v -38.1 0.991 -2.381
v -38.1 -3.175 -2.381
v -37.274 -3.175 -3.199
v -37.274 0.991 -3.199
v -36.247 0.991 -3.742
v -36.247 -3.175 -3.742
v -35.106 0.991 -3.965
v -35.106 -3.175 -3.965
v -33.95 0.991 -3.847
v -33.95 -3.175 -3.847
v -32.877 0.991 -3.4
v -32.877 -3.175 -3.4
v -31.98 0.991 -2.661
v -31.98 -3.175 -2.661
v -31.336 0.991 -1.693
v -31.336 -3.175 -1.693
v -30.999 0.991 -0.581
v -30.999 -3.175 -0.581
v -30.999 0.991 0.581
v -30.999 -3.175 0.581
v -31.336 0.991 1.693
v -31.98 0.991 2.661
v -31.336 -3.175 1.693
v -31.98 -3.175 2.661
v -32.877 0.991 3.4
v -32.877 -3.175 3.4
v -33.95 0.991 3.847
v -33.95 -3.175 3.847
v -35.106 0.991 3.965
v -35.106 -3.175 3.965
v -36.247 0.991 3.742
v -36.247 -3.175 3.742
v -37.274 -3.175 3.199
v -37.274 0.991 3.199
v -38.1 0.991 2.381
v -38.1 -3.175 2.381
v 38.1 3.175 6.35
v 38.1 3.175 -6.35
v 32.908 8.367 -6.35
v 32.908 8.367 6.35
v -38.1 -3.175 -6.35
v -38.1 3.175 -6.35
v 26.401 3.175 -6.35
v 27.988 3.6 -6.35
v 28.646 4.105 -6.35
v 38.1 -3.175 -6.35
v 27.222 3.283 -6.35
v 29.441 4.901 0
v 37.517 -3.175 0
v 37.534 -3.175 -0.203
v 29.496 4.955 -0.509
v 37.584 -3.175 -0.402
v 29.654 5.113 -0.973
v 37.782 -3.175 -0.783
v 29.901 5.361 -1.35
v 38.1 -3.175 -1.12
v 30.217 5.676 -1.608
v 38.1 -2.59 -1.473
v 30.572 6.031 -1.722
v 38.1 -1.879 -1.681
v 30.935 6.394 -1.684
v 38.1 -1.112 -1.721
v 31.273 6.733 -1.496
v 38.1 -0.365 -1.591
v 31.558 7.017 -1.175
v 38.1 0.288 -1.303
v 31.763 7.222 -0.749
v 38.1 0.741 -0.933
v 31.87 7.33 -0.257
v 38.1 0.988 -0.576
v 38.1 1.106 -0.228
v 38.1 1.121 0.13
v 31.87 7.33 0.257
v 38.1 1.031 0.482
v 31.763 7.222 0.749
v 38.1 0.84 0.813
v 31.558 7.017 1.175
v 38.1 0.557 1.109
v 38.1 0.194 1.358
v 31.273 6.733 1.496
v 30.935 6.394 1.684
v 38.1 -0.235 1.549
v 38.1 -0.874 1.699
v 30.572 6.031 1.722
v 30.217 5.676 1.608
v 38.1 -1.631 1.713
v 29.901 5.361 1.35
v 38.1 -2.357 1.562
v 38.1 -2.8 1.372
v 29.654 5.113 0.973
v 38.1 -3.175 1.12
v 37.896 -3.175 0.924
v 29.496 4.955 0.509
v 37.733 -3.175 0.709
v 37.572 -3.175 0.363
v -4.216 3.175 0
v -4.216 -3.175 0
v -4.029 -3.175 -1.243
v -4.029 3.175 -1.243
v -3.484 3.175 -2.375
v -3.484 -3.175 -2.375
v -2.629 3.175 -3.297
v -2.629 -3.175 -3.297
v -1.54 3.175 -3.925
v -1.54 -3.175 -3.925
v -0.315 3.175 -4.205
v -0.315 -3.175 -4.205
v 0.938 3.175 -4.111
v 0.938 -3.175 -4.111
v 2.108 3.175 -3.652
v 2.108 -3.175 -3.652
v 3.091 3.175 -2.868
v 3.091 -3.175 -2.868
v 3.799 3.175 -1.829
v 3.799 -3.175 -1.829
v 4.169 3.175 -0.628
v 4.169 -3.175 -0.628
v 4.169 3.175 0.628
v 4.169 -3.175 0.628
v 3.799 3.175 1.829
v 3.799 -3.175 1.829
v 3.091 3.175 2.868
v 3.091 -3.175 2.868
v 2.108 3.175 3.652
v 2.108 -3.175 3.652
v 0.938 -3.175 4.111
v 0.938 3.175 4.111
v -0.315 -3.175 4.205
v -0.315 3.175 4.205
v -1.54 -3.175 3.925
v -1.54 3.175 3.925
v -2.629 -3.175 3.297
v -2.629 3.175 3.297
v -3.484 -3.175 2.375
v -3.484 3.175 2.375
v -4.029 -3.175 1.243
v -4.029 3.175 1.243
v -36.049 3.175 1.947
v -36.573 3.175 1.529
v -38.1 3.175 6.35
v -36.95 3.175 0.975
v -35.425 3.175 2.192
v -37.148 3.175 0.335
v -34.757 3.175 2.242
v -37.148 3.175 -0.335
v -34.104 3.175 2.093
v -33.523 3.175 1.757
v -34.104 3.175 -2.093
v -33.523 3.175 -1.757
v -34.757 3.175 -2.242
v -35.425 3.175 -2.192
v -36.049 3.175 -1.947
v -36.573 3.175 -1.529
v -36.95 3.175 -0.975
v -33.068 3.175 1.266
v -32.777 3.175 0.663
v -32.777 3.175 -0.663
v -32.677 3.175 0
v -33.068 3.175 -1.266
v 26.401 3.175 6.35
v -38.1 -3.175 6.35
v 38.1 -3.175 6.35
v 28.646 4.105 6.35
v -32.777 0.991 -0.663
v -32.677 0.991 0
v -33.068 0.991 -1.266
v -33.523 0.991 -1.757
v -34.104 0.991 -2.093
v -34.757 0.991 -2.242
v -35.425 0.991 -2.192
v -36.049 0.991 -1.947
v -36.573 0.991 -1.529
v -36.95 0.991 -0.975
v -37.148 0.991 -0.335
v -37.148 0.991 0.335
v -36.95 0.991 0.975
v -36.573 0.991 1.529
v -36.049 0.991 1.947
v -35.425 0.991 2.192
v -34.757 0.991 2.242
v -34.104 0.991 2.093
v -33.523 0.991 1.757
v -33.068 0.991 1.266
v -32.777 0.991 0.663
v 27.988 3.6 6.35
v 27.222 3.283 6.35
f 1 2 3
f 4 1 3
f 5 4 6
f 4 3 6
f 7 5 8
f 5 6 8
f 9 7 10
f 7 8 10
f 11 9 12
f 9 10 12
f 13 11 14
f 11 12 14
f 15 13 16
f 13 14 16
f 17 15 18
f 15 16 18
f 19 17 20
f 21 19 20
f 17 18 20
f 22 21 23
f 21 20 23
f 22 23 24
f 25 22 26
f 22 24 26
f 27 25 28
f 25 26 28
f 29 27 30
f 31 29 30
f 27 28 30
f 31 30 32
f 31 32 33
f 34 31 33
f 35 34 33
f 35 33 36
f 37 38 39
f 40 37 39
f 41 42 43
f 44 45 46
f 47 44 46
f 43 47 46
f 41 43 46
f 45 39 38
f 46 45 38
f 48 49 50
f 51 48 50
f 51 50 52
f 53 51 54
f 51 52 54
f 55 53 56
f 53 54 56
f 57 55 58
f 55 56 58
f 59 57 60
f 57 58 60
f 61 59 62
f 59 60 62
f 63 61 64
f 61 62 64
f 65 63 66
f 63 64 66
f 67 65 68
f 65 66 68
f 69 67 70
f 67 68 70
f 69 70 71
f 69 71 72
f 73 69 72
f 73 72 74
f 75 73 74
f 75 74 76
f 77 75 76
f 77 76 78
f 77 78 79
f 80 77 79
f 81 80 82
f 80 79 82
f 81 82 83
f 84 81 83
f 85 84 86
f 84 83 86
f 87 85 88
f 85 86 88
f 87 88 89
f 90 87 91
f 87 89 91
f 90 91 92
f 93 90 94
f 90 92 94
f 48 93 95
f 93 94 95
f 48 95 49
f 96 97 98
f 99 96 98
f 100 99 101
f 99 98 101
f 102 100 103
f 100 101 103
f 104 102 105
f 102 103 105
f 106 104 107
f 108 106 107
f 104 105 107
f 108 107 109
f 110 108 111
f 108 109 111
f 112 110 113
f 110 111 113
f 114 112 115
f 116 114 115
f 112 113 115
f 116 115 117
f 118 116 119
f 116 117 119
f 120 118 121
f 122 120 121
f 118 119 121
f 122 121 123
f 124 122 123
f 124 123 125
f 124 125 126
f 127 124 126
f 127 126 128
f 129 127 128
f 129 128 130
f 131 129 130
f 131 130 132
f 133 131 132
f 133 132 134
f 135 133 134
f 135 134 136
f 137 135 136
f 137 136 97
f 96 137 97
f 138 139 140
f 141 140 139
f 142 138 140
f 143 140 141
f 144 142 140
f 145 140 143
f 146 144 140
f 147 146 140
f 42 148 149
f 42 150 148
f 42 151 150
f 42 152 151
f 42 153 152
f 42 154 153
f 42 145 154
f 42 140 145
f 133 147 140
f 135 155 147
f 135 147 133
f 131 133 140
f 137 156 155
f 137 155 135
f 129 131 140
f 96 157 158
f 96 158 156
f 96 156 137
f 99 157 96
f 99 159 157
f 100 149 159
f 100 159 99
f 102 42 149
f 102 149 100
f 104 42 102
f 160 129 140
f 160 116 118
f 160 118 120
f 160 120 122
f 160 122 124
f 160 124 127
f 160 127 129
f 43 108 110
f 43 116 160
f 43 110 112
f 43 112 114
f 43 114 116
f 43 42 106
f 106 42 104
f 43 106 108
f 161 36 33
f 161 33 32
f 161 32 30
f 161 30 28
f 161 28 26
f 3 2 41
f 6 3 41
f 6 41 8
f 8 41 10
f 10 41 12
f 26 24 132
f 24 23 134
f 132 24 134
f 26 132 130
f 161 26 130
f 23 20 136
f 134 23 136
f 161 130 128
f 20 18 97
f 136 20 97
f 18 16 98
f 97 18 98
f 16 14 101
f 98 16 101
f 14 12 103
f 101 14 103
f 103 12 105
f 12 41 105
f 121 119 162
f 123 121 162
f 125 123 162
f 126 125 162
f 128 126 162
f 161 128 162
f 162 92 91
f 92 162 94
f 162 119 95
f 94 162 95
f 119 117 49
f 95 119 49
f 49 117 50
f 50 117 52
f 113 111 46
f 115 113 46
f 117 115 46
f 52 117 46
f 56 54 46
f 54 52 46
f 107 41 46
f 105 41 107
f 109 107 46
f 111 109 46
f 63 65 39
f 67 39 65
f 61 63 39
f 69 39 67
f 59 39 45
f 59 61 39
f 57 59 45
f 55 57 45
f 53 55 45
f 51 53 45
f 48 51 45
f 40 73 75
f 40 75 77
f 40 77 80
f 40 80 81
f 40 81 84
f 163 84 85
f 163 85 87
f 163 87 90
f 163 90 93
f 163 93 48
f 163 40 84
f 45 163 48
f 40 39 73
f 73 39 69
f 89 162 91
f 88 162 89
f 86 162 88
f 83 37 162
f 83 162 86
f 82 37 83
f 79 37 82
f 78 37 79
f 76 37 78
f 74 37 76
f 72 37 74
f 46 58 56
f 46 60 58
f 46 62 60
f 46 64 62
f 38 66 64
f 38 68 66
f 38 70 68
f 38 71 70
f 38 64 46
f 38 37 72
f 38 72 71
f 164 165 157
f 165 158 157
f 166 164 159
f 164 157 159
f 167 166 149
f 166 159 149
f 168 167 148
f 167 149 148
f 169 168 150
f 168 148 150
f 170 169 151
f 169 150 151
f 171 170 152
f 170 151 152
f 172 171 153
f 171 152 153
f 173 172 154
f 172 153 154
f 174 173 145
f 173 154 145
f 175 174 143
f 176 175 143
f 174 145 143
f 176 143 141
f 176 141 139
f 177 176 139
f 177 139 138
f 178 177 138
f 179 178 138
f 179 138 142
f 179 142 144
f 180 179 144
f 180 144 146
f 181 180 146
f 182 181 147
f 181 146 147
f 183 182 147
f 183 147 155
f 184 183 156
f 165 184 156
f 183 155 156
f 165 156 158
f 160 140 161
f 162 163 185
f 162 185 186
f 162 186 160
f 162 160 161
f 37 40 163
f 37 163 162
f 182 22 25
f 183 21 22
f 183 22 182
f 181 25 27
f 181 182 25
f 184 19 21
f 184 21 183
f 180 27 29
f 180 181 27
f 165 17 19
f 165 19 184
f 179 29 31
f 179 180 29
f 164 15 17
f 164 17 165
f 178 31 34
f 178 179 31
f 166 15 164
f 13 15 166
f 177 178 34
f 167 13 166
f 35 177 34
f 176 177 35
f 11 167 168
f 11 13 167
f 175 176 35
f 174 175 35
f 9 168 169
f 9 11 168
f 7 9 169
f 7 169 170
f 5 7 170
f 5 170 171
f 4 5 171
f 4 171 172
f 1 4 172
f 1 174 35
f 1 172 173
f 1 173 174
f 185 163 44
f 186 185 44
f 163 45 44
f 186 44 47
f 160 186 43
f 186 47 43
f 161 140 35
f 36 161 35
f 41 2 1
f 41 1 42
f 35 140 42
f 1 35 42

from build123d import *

# Parameters (mm, degrees)
SKETCH1_W                                      = 76.2
SKETCH1_H                                      = 12.7
BOSS_EXTRUDE1_DEPTH                            = 3.175
F_5_16_CLEARANCE_HOLE1_D                       = 8.4328
F_5_16_CLEARANCE_HOLE1_DEPTH                   = 16.51
F_5_16_CLEARANCE_HOLE1_TIP                     = 2.533468714
BOSS_EXTRUDE2_DEPTH                            = 6.35
CBORE_FOR_8_SOCKET_HEAD_CAP_SCREW1_D           = 4.4958
CBORE_FOR_8_SOCKET_HEAD_CAP_SCREW1_DEPTH       = 16.51
CBORE_FOR_8_SOCKET_HEAD_CAP_SCREW1_CBORE_D     = 7.9375
CBORE_FOR_8_SOCKET_HEAD_CAP_SCREW1_CBORE_DEPTH = 4.1656
CBORE_FOR_8_SOCKET_HEAD_CAP_SCREW1_TIP         = 1.350674586
F_8_32_TAPPED_HOLE1_D                          = 3.4544
FILLET1_R                                      = 3.175


with BuildPart() as part:
    # Sketch1 → Boss-Extrude1 (new, symmetric)
    with BuildSketch(Plane(origin=(0, 0, 0), x_dir=(1, 0, 0), z_dir=(0, 1, 0))):
        Rectangle(SKETCH1_W, SKETCH1_H)
    extrude(amount=BOSS_EXTRUDE1_DEPTH, both=True)

    # 5/16 Clearance Hole1
    with Locations(Plane(origin=(0, 3.175, 0), x_dir=(1, 0, 0), z_dir=(0, 1, 0))):
        with Locations((0, 0)):
            Hole(F_5_16_CLEARANCE_HOLE1_D / 2, depth=F_5_16_CLEARANCE_HOLE1_DEPTH)
            with Locations((0, 0, -(F_5_16_CLEARANCE_HOLE1_DEPTH + F_5_16_CLEARANCE_HOLE1_TIP / 2))):  # 118° drill point
                Cone(0, F_5_16_CLEARANCE_HOLE1_D / 2, F_5_16_CLEARANCE_HOLE1_TIP, mode=Mode.SUBTRACT)

    # Sketch6 → Boss-Extrude2 (add, symmetric)
    with BuildSketch(Plane.XY):
        Polygon((38.1, 3.175), (32.907844009, 8.367155991), (27.715688019, 3.175), align=None)
    extrude(amount=BOSS_EXTRUDE2_DEPTH, both=True)

    # CBORE for #8 Socket Head Cap Screw1
    with Locations(Plane(origin=(0, -3.175, 0), x_dir=(-1, 0, 0), z_dir=(0, -1, 0))):
        with Locations((34.925, 0)):
            CounterBoreHole(CBORE_FOR_8_SOCKET_HEAD_CAP_SCREW1_D / 2, CBORE_FOR_8_SOCKET_HEAD_CAP_SCREW1_CBORE_D / 2, CBORE_FOR_8_SOCKET_HEAD_CAP_SCREW1_CBORE_DEPTH, depth=CBORE_FOR_8_SOCKET_HEAD_CAP_SCREW1_DEPTH)
            with Locations((0, 0, -(CBORE_FOR_8_SOCKET_HEAD_CAP_SCREW1_DEPTH + CBORE_FOR_8_SOCKET_HEAD_CAP_SCREW1_TIP / 2))):  # 118° drill point
                Cone(0, CBORE_FOR_8_SOCKET_HEAD_CAP_SCREW1_D / 2, CBORE_FOR_8_SOCKET_HEAD_CAP_SCREW1_TIP, mode=Mode.SUBTRACT)

    # #8-32 Tapped Hole1 (through all)
    with Locations(Plane(origin=(12.270344009, -12.270344009, 0), x_dir=(0.7071067811865476, 0.7071067811865475, 0), z_dir=(-0.7071067811865475, 0.7071067811865476, 0))):
        with Locations((26.010832393, 0)):
            Hole(F_8_32_TAPPED_HOLE1_D / 2)

    # Fillet1
    fillet1_edges = [part.edges().sort_by_distance(p)[0] for p in [
        (27.715688019, 3.175, 0),
    ]]
    fillet(fillet1_edges, radius=FILLET1_R)


solid = part.part
